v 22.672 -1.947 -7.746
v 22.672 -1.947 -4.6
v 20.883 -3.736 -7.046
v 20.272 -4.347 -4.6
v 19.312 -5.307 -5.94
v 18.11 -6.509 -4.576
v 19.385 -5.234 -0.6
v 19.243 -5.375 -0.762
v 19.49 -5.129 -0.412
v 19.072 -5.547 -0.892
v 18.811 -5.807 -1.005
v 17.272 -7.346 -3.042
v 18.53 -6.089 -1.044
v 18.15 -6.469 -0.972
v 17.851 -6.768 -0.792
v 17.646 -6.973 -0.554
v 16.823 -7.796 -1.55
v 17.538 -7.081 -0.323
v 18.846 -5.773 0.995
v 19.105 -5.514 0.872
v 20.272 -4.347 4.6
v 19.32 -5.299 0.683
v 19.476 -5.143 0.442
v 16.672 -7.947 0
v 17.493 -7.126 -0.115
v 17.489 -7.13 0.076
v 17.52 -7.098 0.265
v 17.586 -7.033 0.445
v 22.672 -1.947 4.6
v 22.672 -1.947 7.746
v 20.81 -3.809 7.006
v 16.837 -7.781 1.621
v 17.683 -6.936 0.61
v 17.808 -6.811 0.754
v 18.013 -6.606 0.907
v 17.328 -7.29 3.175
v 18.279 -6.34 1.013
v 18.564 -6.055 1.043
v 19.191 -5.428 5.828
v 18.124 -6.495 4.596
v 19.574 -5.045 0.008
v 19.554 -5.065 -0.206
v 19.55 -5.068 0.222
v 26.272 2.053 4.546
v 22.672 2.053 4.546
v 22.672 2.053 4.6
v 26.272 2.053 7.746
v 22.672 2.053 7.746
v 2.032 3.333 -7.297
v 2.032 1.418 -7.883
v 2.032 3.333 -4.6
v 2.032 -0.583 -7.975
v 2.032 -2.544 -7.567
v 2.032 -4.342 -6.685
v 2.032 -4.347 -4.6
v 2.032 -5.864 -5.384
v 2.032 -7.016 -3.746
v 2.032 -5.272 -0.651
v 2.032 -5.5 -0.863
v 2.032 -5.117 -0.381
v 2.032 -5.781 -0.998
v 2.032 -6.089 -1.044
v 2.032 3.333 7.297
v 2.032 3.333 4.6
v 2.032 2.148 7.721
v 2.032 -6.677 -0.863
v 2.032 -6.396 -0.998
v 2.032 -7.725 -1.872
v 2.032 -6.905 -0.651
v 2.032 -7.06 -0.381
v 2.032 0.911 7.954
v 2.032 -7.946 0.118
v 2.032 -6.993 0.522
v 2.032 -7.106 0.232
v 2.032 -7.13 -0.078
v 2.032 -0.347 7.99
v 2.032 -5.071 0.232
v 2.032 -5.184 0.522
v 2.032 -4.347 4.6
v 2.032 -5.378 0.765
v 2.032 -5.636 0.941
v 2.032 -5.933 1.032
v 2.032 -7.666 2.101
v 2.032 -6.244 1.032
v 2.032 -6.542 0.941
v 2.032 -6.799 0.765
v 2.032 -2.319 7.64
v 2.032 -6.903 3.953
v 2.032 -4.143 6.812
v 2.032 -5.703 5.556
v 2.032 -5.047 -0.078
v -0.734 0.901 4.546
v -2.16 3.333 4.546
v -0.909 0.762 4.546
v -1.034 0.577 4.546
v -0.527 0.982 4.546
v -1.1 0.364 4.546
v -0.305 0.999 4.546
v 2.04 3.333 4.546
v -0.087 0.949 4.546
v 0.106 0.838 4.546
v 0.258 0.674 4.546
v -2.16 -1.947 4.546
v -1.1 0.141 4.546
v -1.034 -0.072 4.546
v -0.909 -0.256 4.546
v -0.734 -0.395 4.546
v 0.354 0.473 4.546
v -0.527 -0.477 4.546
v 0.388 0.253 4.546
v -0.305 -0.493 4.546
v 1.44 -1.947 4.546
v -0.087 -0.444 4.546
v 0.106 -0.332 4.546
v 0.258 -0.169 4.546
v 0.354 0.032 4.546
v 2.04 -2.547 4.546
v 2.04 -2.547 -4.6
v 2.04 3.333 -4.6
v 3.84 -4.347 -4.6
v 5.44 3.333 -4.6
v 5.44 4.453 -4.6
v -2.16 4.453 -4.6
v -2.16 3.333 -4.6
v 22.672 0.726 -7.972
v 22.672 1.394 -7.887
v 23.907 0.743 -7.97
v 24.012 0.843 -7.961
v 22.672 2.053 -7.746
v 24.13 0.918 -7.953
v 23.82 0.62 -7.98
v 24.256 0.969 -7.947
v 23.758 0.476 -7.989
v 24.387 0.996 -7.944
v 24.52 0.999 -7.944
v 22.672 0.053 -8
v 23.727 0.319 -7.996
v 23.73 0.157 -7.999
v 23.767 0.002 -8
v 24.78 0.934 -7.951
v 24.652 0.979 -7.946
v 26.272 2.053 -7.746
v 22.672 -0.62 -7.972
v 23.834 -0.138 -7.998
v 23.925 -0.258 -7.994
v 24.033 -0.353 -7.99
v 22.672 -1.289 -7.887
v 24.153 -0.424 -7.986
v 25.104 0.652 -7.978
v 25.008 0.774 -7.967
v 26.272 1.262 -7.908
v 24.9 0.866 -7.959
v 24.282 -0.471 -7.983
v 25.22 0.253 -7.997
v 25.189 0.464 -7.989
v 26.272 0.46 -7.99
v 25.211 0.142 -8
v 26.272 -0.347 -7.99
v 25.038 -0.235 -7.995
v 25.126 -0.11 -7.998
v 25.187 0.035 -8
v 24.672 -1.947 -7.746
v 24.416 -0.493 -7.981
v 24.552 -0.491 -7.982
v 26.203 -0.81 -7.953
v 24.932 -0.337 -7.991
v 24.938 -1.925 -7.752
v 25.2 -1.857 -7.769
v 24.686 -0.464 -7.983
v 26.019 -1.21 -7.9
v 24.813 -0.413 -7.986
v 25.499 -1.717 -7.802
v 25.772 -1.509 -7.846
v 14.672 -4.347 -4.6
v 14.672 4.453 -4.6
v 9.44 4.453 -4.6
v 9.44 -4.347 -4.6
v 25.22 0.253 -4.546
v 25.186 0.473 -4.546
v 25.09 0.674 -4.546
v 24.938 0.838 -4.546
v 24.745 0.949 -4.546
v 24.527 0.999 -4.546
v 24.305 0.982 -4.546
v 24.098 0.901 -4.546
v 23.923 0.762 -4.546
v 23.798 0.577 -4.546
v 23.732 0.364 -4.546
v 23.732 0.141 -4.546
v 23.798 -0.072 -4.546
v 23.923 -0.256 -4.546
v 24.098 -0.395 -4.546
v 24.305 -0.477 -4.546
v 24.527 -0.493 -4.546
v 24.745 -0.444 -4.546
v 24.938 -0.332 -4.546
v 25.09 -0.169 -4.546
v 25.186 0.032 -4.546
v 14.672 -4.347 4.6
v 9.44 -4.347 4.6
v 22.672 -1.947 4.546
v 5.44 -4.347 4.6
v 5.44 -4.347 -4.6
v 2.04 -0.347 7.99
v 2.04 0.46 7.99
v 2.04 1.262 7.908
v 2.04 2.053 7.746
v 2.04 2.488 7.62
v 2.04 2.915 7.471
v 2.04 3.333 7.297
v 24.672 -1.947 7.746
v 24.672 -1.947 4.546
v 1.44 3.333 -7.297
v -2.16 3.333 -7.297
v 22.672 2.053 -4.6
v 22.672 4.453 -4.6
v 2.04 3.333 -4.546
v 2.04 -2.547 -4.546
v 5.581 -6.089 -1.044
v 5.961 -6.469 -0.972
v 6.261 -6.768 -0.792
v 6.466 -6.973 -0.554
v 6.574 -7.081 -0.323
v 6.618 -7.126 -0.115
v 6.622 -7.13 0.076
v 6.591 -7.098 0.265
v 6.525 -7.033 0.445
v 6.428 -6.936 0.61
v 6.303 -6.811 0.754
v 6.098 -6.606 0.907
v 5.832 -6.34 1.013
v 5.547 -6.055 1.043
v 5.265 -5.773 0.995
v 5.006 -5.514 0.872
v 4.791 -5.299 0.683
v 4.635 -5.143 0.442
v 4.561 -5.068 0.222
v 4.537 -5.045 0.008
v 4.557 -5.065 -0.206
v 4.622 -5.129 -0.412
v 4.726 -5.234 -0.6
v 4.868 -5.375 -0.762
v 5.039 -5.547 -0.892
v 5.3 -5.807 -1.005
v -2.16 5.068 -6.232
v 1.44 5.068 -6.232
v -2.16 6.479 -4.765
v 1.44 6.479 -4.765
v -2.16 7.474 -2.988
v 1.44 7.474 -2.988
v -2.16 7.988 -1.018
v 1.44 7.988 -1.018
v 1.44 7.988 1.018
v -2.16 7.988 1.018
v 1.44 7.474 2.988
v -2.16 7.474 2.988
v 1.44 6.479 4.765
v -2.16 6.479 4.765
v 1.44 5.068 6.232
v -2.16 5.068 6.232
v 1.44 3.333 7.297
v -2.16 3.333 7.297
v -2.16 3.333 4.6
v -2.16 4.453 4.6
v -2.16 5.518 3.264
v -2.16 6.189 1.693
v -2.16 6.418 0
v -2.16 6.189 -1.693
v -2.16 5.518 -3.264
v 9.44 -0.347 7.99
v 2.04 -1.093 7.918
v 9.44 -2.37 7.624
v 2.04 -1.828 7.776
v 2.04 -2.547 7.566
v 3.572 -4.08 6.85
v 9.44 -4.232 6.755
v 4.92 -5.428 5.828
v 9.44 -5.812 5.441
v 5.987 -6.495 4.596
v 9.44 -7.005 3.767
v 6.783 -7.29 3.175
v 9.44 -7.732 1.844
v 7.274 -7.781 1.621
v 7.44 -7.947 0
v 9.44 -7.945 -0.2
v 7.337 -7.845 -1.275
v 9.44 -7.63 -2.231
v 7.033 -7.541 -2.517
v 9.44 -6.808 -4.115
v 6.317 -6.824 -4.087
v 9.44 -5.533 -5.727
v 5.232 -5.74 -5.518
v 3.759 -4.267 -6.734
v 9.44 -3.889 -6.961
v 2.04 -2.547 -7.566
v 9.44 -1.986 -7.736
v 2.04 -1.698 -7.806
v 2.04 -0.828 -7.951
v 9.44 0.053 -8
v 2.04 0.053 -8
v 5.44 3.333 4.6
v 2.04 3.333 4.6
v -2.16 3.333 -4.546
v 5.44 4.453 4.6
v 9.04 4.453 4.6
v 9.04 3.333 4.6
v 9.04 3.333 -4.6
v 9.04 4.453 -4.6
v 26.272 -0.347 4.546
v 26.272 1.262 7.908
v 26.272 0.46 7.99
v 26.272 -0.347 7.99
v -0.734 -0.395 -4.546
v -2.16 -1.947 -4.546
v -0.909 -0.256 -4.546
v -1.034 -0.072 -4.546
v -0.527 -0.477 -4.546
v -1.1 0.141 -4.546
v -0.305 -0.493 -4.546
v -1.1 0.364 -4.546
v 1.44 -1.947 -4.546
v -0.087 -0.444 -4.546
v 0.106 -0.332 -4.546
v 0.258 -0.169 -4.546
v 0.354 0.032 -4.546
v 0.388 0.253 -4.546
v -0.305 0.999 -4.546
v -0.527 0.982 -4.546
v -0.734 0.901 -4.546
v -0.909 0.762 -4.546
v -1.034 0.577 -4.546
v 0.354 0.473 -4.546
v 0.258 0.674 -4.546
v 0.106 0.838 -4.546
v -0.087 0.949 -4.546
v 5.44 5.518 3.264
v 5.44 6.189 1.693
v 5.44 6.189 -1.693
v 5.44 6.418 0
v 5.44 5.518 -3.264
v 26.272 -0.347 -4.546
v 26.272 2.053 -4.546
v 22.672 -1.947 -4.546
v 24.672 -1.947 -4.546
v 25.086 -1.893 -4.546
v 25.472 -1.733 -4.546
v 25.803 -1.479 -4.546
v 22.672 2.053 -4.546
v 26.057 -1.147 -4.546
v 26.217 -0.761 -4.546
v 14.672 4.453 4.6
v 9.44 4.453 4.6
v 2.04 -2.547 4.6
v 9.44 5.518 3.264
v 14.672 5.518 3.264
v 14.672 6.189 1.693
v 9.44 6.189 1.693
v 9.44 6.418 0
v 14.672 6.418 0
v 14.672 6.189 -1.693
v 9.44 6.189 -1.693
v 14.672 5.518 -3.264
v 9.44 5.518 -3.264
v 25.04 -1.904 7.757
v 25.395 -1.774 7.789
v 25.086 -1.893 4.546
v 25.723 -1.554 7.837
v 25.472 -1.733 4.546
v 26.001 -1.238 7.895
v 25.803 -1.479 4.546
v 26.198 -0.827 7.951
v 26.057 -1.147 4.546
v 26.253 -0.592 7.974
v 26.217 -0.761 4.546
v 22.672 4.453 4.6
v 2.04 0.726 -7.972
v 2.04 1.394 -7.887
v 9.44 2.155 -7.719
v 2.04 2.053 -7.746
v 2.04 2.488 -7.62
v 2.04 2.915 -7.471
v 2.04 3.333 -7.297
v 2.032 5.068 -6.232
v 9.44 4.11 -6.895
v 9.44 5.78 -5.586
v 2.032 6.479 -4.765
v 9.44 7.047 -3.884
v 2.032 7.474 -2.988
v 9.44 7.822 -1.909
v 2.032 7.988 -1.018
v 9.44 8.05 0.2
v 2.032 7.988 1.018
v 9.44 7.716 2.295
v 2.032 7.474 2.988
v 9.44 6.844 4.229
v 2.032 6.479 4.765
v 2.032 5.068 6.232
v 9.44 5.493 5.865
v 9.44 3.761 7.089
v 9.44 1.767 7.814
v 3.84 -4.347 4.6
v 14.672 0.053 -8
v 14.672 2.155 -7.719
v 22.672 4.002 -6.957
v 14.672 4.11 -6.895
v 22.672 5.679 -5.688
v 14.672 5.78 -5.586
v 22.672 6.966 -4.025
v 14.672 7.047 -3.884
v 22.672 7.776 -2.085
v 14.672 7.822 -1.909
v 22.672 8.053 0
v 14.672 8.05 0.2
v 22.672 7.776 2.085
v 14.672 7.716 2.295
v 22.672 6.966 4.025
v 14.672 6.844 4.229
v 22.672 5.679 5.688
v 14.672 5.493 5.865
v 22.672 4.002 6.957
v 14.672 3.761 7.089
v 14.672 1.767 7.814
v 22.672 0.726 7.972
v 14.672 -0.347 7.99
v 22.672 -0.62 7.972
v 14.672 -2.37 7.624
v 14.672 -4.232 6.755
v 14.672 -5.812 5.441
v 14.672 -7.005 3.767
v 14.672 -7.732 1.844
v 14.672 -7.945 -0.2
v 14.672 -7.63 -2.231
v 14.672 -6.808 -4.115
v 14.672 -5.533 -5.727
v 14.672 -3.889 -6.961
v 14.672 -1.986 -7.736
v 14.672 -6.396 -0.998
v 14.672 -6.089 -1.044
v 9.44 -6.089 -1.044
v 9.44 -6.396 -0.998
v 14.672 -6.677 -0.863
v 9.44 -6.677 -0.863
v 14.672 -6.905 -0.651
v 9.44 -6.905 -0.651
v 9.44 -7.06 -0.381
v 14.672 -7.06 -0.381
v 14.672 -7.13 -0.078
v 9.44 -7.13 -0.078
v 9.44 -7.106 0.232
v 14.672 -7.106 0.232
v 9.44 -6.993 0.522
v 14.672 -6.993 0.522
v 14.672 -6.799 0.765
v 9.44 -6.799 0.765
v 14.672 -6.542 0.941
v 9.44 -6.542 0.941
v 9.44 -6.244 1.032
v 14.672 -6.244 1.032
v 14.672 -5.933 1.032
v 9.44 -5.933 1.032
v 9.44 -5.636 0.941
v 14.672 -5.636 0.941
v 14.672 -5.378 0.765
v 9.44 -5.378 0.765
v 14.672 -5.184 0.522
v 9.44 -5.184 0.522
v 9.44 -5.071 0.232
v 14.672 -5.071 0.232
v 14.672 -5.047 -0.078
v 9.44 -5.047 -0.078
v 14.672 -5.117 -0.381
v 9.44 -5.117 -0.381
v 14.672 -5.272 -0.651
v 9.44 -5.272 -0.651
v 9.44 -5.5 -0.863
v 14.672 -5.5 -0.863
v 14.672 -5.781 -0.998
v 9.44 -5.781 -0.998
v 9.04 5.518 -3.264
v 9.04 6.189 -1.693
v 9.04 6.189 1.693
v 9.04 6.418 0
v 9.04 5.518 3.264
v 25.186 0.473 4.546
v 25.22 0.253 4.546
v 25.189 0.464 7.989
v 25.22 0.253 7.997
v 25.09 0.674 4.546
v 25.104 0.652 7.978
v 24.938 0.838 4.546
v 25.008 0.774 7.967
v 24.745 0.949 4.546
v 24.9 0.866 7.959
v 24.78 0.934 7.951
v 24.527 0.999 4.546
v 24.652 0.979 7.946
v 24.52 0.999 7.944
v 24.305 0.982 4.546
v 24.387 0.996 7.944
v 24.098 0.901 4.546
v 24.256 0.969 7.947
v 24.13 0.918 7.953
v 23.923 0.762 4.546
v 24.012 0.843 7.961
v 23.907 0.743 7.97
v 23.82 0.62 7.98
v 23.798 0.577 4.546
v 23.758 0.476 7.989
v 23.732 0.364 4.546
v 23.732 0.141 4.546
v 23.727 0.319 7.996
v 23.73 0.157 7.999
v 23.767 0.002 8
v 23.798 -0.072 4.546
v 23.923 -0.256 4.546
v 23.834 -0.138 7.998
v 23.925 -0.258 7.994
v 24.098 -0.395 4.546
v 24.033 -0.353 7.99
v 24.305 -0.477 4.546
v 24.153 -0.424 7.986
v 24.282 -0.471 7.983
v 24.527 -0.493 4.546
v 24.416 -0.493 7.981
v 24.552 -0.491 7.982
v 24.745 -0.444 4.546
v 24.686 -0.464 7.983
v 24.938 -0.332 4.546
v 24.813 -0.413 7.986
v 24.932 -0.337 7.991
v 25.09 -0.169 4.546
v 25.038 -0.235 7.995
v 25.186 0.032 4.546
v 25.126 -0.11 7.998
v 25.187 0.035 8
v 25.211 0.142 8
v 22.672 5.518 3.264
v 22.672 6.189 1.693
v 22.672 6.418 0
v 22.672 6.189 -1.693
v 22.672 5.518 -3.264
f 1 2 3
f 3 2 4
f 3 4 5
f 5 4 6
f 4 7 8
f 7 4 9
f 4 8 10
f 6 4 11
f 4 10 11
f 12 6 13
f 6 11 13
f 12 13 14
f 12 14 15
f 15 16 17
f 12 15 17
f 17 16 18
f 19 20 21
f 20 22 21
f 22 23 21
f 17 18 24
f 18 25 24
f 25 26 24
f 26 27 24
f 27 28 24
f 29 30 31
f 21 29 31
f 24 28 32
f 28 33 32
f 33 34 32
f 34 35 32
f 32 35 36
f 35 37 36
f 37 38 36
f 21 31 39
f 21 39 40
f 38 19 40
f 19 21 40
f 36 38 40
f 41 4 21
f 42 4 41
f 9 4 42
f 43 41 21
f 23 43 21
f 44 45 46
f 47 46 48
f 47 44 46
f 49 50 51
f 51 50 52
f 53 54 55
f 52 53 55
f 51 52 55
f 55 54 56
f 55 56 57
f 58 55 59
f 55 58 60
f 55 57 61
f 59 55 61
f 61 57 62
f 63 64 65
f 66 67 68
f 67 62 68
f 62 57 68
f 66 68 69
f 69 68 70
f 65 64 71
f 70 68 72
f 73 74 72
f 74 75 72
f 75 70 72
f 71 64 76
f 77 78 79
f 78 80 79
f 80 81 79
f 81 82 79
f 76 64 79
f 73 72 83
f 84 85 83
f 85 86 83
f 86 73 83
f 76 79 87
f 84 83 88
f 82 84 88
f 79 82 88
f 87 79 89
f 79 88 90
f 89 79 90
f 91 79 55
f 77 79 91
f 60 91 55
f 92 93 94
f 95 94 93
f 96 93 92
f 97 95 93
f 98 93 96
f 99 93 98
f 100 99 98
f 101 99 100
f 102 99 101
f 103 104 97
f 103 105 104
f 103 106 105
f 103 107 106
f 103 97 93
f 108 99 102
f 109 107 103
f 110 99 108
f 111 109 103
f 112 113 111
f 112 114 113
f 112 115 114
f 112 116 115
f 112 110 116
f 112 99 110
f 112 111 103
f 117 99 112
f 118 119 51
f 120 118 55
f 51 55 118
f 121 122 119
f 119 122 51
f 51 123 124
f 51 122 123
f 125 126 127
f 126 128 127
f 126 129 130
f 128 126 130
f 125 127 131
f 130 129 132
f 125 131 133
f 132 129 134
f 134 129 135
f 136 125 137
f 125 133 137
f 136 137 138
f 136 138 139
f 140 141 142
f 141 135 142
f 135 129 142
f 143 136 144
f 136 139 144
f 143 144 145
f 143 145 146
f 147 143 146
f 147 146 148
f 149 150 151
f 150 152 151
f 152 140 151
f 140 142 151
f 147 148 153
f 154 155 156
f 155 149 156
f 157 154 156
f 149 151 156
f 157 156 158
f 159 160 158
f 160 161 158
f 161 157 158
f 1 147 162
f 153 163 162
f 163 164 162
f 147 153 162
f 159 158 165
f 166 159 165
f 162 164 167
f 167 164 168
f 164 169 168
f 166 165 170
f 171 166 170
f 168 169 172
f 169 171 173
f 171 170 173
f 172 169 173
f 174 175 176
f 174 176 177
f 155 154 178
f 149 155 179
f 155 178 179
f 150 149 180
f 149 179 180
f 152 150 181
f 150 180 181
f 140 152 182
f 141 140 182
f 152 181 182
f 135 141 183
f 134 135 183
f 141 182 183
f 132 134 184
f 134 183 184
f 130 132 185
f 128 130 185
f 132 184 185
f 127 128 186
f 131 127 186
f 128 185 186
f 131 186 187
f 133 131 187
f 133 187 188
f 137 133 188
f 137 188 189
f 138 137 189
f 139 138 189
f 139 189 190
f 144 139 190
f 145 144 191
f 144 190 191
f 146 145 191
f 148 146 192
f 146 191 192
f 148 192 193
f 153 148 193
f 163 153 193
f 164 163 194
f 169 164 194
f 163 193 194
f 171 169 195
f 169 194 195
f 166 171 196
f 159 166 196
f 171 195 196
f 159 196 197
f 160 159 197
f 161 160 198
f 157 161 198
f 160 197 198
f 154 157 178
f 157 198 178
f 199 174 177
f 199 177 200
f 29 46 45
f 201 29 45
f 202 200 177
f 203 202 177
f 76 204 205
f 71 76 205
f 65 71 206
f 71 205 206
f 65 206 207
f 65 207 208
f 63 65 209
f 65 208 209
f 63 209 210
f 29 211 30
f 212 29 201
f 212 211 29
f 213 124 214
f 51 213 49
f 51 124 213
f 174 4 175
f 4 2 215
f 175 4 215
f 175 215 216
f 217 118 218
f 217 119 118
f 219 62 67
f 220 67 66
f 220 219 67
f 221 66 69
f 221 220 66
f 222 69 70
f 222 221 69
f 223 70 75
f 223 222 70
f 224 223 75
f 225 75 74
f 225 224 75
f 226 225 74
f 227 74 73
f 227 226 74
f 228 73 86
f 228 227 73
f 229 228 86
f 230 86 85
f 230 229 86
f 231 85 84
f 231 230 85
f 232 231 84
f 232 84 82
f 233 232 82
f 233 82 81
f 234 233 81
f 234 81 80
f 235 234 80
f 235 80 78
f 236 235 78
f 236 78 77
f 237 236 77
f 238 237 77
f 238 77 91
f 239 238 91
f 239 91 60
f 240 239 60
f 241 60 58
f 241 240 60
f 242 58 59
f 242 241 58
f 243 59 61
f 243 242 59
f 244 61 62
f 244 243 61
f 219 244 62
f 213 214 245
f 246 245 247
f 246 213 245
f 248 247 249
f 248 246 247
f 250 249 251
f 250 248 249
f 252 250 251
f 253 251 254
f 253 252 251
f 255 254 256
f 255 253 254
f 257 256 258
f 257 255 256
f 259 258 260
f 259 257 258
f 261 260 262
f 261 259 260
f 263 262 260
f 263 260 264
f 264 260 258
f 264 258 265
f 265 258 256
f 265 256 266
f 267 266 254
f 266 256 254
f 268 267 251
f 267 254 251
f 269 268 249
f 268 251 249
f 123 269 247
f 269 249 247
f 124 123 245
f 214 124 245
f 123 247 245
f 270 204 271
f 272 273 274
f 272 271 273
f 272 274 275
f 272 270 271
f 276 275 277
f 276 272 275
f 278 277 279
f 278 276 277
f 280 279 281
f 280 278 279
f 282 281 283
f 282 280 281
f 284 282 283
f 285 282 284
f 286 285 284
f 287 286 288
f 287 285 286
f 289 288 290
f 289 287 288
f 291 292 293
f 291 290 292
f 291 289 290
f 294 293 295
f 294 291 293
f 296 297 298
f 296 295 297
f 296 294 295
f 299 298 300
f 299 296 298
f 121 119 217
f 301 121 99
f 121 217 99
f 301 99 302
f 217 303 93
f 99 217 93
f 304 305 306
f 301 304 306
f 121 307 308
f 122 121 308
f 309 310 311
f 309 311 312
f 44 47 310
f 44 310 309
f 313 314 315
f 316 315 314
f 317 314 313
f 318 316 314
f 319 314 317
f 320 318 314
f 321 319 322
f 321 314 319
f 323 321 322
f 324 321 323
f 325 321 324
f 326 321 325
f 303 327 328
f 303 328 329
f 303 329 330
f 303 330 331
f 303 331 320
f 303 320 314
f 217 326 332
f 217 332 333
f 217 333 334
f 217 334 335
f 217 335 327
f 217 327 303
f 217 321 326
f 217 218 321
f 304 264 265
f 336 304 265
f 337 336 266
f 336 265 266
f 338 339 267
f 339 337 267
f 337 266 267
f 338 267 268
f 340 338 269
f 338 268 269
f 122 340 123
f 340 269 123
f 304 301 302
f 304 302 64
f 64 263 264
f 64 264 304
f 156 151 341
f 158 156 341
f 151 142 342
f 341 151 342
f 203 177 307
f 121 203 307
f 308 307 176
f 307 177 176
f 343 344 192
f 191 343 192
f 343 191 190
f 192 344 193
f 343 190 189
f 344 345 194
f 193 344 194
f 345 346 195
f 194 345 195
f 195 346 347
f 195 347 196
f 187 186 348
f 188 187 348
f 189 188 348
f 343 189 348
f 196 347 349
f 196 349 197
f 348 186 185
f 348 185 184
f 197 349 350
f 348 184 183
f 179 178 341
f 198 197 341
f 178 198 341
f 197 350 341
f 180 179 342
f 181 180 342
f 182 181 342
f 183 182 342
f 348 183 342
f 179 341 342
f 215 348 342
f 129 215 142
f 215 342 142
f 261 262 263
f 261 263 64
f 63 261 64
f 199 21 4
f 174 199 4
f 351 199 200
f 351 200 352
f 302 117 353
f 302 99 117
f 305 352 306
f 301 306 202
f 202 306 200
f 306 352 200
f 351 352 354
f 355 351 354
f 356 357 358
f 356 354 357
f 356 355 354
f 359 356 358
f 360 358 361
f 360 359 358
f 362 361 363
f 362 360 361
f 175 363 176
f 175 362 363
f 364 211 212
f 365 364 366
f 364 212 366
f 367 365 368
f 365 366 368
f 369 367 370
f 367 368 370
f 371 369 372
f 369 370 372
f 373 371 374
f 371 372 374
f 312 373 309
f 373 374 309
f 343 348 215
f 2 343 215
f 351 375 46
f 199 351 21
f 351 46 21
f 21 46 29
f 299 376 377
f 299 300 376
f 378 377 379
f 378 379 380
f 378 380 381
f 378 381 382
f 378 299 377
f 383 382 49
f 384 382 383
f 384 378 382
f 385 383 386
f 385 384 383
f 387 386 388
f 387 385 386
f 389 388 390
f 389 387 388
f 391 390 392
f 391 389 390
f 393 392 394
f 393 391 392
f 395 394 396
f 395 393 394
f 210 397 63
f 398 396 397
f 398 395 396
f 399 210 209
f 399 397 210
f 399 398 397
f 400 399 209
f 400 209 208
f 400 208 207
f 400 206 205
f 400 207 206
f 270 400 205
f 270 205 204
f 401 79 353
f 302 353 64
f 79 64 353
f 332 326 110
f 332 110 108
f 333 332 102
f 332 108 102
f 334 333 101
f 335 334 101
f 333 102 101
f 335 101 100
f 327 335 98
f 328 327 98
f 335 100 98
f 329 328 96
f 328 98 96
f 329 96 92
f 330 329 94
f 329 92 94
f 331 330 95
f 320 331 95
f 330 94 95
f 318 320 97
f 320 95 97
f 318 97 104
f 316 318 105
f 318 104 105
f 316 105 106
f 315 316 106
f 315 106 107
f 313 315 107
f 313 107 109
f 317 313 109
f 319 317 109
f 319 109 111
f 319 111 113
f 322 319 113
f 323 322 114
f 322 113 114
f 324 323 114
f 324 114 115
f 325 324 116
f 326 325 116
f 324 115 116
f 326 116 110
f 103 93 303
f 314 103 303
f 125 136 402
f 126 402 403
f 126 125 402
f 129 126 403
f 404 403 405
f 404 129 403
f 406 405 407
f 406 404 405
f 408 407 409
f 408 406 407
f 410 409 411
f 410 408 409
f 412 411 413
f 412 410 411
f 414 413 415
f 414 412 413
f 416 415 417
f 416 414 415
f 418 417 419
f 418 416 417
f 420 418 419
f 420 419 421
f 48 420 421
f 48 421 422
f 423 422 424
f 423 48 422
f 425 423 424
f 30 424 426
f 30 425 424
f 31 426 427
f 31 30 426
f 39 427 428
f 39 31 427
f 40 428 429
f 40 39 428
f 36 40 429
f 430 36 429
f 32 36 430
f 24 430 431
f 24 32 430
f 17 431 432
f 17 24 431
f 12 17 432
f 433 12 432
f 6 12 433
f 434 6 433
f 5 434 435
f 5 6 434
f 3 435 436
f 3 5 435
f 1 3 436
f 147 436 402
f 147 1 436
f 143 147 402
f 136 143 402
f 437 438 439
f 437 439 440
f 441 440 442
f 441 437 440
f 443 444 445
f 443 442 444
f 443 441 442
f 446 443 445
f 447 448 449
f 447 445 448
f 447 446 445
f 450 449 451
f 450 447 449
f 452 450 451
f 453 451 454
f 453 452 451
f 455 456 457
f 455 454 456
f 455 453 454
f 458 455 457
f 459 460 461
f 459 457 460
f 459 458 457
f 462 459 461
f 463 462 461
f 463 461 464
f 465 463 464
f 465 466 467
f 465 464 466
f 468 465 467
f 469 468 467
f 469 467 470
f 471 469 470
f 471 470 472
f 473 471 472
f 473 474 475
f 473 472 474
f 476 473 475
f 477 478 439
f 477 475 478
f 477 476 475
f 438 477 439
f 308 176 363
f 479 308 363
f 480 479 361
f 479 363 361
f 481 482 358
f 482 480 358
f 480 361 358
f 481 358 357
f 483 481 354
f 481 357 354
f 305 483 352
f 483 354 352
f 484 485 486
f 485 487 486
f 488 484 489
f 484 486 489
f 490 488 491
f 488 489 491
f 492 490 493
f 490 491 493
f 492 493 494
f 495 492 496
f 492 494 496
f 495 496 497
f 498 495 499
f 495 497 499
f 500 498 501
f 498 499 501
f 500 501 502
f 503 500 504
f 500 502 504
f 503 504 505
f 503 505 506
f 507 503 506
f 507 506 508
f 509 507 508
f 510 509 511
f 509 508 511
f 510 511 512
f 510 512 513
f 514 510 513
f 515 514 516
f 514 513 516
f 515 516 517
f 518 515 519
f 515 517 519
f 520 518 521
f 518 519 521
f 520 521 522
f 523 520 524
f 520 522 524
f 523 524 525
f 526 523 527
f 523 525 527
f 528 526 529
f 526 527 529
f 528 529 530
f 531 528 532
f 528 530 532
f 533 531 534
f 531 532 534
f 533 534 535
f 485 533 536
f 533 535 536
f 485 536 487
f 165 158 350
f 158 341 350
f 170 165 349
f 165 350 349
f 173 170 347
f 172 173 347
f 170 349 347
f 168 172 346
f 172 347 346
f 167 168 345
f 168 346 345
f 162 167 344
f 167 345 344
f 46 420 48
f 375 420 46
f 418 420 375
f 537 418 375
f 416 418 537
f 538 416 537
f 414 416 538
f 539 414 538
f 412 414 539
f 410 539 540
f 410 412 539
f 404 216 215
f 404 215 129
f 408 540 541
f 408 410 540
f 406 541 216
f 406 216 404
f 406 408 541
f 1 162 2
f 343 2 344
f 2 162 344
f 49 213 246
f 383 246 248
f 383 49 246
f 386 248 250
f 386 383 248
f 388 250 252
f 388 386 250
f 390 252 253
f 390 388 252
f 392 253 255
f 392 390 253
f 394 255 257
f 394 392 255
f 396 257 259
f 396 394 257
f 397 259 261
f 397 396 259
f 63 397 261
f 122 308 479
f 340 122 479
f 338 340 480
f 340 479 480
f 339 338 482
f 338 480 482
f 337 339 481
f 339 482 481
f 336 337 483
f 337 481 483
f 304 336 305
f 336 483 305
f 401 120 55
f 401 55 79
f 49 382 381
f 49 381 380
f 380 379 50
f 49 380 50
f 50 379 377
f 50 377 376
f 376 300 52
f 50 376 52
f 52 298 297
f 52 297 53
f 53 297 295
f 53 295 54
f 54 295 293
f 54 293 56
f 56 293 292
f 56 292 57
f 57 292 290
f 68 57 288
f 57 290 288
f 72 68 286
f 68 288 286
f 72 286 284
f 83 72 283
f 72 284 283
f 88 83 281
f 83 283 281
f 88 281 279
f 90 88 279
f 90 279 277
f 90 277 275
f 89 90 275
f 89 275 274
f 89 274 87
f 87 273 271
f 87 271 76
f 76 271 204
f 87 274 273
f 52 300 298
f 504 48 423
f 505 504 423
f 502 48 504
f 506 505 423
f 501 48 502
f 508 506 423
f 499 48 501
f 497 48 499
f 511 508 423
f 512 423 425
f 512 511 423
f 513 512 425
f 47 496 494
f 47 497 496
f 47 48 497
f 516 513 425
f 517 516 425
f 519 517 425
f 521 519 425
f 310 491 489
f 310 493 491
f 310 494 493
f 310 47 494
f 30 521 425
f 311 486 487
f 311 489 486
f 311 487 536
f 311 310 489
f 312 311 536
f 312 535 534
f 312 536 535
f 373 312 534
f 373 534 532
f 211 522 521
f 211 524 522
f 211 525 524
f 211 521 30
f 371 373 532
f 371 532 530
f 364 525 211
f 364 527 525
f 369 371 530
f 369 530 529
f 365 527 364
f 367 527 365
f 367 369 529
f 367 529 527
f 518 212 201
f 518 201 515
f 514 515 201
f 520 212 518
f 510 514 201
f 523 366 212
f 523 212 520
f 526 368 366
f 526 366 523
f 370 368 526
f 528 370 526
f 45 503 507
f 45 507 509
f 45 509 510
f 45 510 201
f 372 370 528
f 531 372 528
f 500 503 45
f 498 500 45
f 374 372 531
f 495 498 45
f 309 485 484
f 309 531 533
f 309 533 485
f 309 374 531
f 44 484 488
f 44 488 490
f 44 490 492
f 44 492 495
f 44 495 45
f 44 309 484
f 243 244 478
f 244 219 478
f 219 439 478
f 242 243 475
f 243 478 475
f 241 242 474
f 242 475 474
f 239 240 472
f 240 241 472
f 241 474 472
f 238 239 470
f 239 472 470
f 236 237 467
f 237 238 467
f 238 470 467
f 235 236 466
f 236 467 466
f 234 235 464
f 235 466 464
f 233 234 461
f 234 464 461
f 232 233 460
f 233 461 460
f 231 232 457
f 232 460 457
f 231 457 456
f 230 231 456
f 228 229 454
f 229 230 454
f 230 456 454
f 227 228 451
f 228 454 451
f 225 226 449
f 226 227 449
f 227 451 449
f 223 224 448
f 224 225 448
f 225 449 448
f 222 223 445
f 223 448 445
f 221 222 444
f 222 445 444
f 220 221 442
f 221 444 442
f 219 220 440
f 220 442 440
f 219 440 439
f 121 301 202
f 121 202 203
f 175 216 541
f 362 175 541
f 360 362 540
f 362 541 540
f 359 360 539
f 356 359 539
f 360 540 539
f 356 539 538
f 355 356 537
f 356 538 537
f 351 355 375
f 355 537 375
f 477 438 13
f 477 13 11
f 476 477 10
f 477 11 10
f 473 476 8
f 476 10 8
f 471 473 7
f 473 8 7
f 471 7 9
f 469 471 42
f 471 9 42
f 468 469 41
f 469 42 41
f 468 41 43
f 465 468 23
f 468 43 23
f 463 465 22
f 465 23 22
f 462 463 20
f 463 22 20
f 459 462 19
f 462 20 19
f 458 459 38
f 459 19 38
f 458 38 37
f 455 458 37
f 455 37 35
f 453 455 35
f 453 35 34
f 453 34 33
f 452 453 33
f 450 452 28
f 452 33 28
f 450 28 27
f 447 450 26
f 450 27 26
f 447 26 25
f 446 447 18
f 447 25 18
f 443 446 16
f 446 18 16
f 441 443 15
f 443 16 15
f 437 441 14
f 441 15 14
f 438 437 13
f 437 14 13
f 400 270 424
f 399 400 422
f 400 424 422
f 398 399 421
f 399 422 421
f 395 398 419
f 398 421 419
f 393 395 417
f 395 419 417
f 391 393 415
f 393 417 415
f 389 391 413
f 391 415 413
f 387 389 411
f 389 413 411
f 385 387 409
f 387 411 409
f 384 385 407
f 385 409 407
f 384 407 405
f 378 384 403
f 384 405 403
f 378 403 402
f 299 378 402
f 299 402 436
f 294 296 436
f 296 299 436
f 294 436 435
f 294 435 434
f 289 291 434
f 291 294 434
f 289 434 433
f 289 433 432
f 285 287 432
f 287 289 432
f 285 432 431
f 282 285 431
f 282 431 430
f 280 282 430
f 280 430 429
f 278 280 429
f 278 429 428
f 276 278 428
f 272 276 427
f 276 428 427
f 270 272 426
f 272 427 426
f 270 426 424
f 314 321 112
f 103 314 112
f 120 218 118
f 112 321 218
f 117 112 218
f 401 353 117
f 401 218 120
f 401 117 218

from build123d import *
from build123d.topology import SkipClean

# Parameters (mm, degrees)
SKETCH1_R           = 10
BOSS_EXTRUDE1_DEPTH = 10
SKETCH4_R           = 1.305
CUT_EXTRUDE3_DEPTH  = 25.5
BOSS_EXTRUDE2_START = 4.5
BOSS_EXTRUDE2_DEPTH = 4.5
SKETCH6_R           = 0.935
CUT_EXTRUDE4_DEPTH  = 12.25
SKETCH7_W           = 11.364916732
SKETCH7_H           = 5
BOSS_EXTRUDE3_DEPTH = 4.5
SKETCH8_R           = 0.935
CUT_EXTRUDE5_DEPTH  = 7.25
BOSS_EXTRUDE4_DEPTH = 4.5
CUT_EXTRUDE6_START  = -0.75
CUT_EXTRUDE6_DEPTH  = 0.75
SKETCH12_W          = 5.25
SKETCH12_H          = 4
CUT_EXTRUDE7_DEPTH  = 1.6
CUT_EXTRUDE8_DEPTH  = 15.8
FILLET1_R           = 2
CUT_EXTRUDE9_DEPTH  = 10.8
SKETCH15_W          = 11.364916732
SKETCH15_H          = 6.6
CUT_EXTRUDE10_DEPTH = 1.6
CUT_EXTRUDE11_DEPTH = 15
BOSS_EXTRUDE5_REACH = 35.438
SKETCH17_R          = 10
SKETCH17_R_2        = 1.305
CUT_EXTRUDE12_DEPTH = 14
SCALE1_SCALE        = 0.8


# Read off the part's stored shape, not the designer's step: Cut-Extrude6
with BuildPart() as part:
    # Sketch1 → Boss-Extrude1 (new, symmetric)
    with BuildSketch(Plane(origin=(0, 0, 0), x_dir=(0, 0, -1), z_dir=(1, 0, 0))):
        Circle(SKETCH1_R)
    extrude(amount=BOSS_EXTRUDE1_DEPTH, both=True)

    # Sketch4 → Cut-Extrude3 (cut, symmetric)
    with BuildSketch(Plane(origin=(0, -0.76336978, 0), x_dir=(0, 0, -1), z_dir=(1, 0, 0))):
        with Locations((0, -6.913267104)):
            Circle(SKETCH4_R)
    extrude(amount=CUT_EXTRUDE3_DEPTH, both=True, mode=Mode.SUBTRACT)

    # Sketch5 → Boss-Extrude2 (add)
    with BuildSketch(Plane(origin=(10, 0, 0), x_dir=(0, 0, -1), z_dir=(1, 0, 0)).offset(BOSS_EXTRUDE2_START)):
        with BuildLine():
            Line((-9.682458366, -2.5), (-5.682458366, -2.5))
            Line((-5.682458366, -2.5), (-5.682458366, 2.5))
            Line((-5.682458366, 2.5), (-9.682458366, 2.5))
            ThreePointArc((-9.682458366, 2.5), (-10, 0), (-9.682458366, -2.5))
        make_face()
    boss_extrude2 = extrude(amount=-BOSS_EXTRUDE2_DEPTH)

    # Mirror1: Boss-Extrude2 across plane
    add(boss_extrude2.mirror(Plane.XY))

    # Sketch6 → Cut-Extrude4 (cut, symmetric)
    with SkipClean():  # the faces are left unmerged after this step: merging them gives an invalid solid
        with BuildSketch(Plane.XY):
            with Locations((12.25, 0.25)):
                Circle(SKETCH6_R)
        extrude(amount=CUT_EXTRUDE4_DEPTH, both=True, mode=Mode.SUBTRACT)

    # Sketch7 → Boss-Extrude3 (add)
    with SkipClean():  # the faces are left unmerged after this step: merging them gives an invalid solid
        with BuildSketch(Plane.ZY.offset(10)):
            Rectangle(SKETCH7_W, SKETCH7_H)
        extrude(amount=BOSS_EXTRUDE3_DEPTH)

    # Sketch8 → Cut-Extrude5 (cut, symmetric)
    with SkipClean():  # the faces are left unmerged after this step: merging them gives an invalid solid
        with BuildSketch(Plane.XY):
            with Locations((-12.25, 0.25)):
                Circle(SKETCH8_R)
        extrude(amount=CUT_EXTRUDE5_DEPTH, both=True, mode=Mode.SUBTRACT)

    # Sketch10 → Boss-Extrude4 (add)
    with SkipClean():  # the faces are left unmerged after this step: merging them gives an invalid solid
        with BuildSketch(Plane.ZY.offset(10)):
            with BuildLine():
                Line((9.682458366, 2.5), (-9.682458366, 2.5))
                ThreePointArc((-9.682458366, 2.5), (0, 10), (9.682458366, 2.5))
            make_face()
        extrude(amount=BOSS_EXTRUDE4_DEPTH)

    # Cut-Extrude6 outline → Cut-Extrude6 (cut)
    with SkipClean():  # the faces are left unmerged after this step: merging them gives an invalid solid
        with BuildSketch(Plane.ZY.offset(10).offset(CUT_EXTRUDE6_START)):
            with BuildLine():
                ThreePointArc((-9.682458366, 2.5), (-9.369942303, -3.493448331), (-5.682458366, -8.228588392))
                Line((-5.682458366, -8.228588392), (-5.682458366, 2.5))
                Line((-5.682458366, 2.5), (-9.682458366, 2.5))
            make_face()
            with BuildLine():
                Line((5.682458366, 2.5), (5.682458366, -8.228588392))
                ThreePointArc((5.682458366, -8.228588392), (9.369942303, -3.493448331), (9.682458366, 2.5))
                Line((9.682458366, 2.5), (5.682458366, 2.5))
            make_face()
        extrude(amount=CUT_EXTRUDE6_DEPTH, mode=Mode.SUBTRACT)

    # Sketch12 → Cut-Extrude7 (cut)
    with SkipClean():  # the faces are left unmerged after this step: merging them gives an invalid solid
        with BuildSketch(Plane.XZ.offset(-2.5)):
            with Locations((-11.875, -7.682458366)):
                Rectangle(SKETCH12_W, SKETCH12_H)
            with Locations((-11.875, 7.682458366)):
                Rectangle(SKETCH12_W, SKETCH12_H)
        extrude(amount=-CUT_EXTRUDE7_DEPTH, mode=Mode.SUBTRACT)

    # Sketch13 → Cut-Extrude8 (cut, symmetric)
    with SkipClean():  # the faces are left unmerged after this step: merging them gives an invalid solid
        with BuildSketch(Plane.XY):
            Polygon((-10, -8.228588392), (-10, -2.5), (-2.5, -10), (-10, -10), align=None)
        extrude(amount=CUT_EXTRUDE8_DEPTH, both=True, mode=Mode.SUBTRACT)

    # Fillet1
    fillet1_edges = [part.edges().sort_by_distance(p)[0] for p in [
        (14.5, -2.5, 7.682458366),
        (14.5, -2.5, -7.682458366),
    ]]
    fillet(fillet1_edges, radius=FILLET1_R)

    # Sketch14 → Cut-Extrude9 (cut, symmetric)
    with SkipClean():  # the faces are left unmerged after this step: merging them gives an invalid solid
        with BuildSketch(Plane.XY):
            Polygon((10, -10), (10, -2.5), (2.5, -10), align=None)
        extrude(amount=CUT_EXTRUDE9_DEPTH, both=True, mode=Mode.SUBTRACT)

    # Sketch15 → Cut-Extrude10 (cut)
    with SkipClean():  # the faces are left unmerged after this step: merging them gives an invalid solid
        with BuildSketch(Plane(origin=(10, 0, 0), x_dir=(0, 0, -1), z_dir=(1, 0, 0))):
            with Locations((0, -0.8)):
                Rectangle(SKETCH15_W, SKETCH15_H)
        extrude(amount=-CUT_EXTRUDE10_DEPTH, mode=Mode.SUBTRACT)

    # Sketch16 → Cut-Extrude11 (cut)
    with SkipClean():  # the faces are left unmerged after this step: merging them gives an invalid solid
        with BuildSketch(Plane(origin=(10, 0, 0), x_dir=(0, 0, -1), z_dir=(1, 0, 0))):
            with BuildLine():
                Line((-5.75, 5.5), (-5.75, -5.5))
                Line((-5.75, -5.5), (5.75, -5.5))
                Line((5.75, -5.5), (5.75, 5.5))
                ThreePointArc((5.75, 5.5), (0, 7.956915231), (-5.75, 5.5))
            make_face()
        extrude(amount=-CUT_EXTRUDE11_DEPTH, mode=Mode.SUBTRACT)


with BuildPart() as body_2:
    # Split1: the piece on the far side of the plane
    add(part.part)
    split(bisect_by=Plane(origin=(0, 0, 0), x_dir=(0, 0, 1), z_dir=(1, 0, 0)), keep=Keep.BOTTOM)


with BuildPart() as part_1:
    add(part.part)

    # Split1
    split(bisect_by=Plane(origin=(0, 0, 0), x_dir=(0, 0, 1), z_dir=(1, 0, 0)), keep=Keep.TOP)


with BuildPart() as part_2:
    # Body-Move/Copy1: moved
    add(part_1.part.moved(Location((15.8, 0, 0))))


    # Sketch17 → Boss-Extrude5 (add, up to next)
    with BuildSketch(Plane.ZY.offset(-15.8), mode=Mode.PRIVATE) as boss_extrude5_sk1:
        with Locations(Location((0, 0, 0), (0, 0, 357.134016017))):
            Circle(SKETCH17_R)
        with Locations(Location((0, -7.676636884, 0), (0, 0, 180))):
            Circle(SKETCH17_R_2, mode=Mode.SUBTRACT)
        with BuildLine():
            Line((-5.75, -5.5), (5.75, -5.5))
            Line((5.75, -5.5), (5.75, 5.5))
            ThreePointArc((5.75, 5.5), (0, 7.956915231), (-5.75, 5.5))
            Line((-5.75, 5.5), (-5.75, -5.5))
        make_face(mode=Mode.SUBTRACT)
    boss_extrude5_tool1 = extrude(boss_extrude5_sk1.sketch, amount=BOSS_EXTRUDE5_REACH, mode=Mode.PRIVATE) - body_2.part
    add(boss_extrude5_tool1.solids().sort_by_distance((15.8, 0.485858, -9.705003))[0])


with BuildPart() as body_2_1:
    # Body-Move/Copy2: moved
    add(body_2.part.moved(Location((9.26, 0, 0))))

    # Combine4: union part
    add(part_2.part)

    # Sketch18 → Cut-Extrude12 (cut)
    with SkipClean():  # the faces are left unmerged after this step: merging them gives an invalid solid
        with BuildSketch(Plane.ZY.offset(5.24)):
            with BuildLine():
                Line((-5.75, 5.5), (-5.75, 4.1))
                Line((-5.75, 4.1), (5.75, 4.1))
                Line((5.75, 4.1), (5.75, 5.5))
                ThreePointArc((5.75, 5.5), (0, 7.956915231), (-5.75, 5.5))
            make_face()
        extrude(amount=-CUT_EXTRUDE12_DEPTH, mode=Mode.SUBTRACT)


with BuildPart() as body_2_2:
    # Scale1: scaled about (10.157754057, 0.26372377, 1.86e-07)
    add(body_2_1.part.scale(SCALE1_SCALE).moved(Location((2.031550811, 0.052744754, 3.7e-08))))


solid = body_2_2.part
